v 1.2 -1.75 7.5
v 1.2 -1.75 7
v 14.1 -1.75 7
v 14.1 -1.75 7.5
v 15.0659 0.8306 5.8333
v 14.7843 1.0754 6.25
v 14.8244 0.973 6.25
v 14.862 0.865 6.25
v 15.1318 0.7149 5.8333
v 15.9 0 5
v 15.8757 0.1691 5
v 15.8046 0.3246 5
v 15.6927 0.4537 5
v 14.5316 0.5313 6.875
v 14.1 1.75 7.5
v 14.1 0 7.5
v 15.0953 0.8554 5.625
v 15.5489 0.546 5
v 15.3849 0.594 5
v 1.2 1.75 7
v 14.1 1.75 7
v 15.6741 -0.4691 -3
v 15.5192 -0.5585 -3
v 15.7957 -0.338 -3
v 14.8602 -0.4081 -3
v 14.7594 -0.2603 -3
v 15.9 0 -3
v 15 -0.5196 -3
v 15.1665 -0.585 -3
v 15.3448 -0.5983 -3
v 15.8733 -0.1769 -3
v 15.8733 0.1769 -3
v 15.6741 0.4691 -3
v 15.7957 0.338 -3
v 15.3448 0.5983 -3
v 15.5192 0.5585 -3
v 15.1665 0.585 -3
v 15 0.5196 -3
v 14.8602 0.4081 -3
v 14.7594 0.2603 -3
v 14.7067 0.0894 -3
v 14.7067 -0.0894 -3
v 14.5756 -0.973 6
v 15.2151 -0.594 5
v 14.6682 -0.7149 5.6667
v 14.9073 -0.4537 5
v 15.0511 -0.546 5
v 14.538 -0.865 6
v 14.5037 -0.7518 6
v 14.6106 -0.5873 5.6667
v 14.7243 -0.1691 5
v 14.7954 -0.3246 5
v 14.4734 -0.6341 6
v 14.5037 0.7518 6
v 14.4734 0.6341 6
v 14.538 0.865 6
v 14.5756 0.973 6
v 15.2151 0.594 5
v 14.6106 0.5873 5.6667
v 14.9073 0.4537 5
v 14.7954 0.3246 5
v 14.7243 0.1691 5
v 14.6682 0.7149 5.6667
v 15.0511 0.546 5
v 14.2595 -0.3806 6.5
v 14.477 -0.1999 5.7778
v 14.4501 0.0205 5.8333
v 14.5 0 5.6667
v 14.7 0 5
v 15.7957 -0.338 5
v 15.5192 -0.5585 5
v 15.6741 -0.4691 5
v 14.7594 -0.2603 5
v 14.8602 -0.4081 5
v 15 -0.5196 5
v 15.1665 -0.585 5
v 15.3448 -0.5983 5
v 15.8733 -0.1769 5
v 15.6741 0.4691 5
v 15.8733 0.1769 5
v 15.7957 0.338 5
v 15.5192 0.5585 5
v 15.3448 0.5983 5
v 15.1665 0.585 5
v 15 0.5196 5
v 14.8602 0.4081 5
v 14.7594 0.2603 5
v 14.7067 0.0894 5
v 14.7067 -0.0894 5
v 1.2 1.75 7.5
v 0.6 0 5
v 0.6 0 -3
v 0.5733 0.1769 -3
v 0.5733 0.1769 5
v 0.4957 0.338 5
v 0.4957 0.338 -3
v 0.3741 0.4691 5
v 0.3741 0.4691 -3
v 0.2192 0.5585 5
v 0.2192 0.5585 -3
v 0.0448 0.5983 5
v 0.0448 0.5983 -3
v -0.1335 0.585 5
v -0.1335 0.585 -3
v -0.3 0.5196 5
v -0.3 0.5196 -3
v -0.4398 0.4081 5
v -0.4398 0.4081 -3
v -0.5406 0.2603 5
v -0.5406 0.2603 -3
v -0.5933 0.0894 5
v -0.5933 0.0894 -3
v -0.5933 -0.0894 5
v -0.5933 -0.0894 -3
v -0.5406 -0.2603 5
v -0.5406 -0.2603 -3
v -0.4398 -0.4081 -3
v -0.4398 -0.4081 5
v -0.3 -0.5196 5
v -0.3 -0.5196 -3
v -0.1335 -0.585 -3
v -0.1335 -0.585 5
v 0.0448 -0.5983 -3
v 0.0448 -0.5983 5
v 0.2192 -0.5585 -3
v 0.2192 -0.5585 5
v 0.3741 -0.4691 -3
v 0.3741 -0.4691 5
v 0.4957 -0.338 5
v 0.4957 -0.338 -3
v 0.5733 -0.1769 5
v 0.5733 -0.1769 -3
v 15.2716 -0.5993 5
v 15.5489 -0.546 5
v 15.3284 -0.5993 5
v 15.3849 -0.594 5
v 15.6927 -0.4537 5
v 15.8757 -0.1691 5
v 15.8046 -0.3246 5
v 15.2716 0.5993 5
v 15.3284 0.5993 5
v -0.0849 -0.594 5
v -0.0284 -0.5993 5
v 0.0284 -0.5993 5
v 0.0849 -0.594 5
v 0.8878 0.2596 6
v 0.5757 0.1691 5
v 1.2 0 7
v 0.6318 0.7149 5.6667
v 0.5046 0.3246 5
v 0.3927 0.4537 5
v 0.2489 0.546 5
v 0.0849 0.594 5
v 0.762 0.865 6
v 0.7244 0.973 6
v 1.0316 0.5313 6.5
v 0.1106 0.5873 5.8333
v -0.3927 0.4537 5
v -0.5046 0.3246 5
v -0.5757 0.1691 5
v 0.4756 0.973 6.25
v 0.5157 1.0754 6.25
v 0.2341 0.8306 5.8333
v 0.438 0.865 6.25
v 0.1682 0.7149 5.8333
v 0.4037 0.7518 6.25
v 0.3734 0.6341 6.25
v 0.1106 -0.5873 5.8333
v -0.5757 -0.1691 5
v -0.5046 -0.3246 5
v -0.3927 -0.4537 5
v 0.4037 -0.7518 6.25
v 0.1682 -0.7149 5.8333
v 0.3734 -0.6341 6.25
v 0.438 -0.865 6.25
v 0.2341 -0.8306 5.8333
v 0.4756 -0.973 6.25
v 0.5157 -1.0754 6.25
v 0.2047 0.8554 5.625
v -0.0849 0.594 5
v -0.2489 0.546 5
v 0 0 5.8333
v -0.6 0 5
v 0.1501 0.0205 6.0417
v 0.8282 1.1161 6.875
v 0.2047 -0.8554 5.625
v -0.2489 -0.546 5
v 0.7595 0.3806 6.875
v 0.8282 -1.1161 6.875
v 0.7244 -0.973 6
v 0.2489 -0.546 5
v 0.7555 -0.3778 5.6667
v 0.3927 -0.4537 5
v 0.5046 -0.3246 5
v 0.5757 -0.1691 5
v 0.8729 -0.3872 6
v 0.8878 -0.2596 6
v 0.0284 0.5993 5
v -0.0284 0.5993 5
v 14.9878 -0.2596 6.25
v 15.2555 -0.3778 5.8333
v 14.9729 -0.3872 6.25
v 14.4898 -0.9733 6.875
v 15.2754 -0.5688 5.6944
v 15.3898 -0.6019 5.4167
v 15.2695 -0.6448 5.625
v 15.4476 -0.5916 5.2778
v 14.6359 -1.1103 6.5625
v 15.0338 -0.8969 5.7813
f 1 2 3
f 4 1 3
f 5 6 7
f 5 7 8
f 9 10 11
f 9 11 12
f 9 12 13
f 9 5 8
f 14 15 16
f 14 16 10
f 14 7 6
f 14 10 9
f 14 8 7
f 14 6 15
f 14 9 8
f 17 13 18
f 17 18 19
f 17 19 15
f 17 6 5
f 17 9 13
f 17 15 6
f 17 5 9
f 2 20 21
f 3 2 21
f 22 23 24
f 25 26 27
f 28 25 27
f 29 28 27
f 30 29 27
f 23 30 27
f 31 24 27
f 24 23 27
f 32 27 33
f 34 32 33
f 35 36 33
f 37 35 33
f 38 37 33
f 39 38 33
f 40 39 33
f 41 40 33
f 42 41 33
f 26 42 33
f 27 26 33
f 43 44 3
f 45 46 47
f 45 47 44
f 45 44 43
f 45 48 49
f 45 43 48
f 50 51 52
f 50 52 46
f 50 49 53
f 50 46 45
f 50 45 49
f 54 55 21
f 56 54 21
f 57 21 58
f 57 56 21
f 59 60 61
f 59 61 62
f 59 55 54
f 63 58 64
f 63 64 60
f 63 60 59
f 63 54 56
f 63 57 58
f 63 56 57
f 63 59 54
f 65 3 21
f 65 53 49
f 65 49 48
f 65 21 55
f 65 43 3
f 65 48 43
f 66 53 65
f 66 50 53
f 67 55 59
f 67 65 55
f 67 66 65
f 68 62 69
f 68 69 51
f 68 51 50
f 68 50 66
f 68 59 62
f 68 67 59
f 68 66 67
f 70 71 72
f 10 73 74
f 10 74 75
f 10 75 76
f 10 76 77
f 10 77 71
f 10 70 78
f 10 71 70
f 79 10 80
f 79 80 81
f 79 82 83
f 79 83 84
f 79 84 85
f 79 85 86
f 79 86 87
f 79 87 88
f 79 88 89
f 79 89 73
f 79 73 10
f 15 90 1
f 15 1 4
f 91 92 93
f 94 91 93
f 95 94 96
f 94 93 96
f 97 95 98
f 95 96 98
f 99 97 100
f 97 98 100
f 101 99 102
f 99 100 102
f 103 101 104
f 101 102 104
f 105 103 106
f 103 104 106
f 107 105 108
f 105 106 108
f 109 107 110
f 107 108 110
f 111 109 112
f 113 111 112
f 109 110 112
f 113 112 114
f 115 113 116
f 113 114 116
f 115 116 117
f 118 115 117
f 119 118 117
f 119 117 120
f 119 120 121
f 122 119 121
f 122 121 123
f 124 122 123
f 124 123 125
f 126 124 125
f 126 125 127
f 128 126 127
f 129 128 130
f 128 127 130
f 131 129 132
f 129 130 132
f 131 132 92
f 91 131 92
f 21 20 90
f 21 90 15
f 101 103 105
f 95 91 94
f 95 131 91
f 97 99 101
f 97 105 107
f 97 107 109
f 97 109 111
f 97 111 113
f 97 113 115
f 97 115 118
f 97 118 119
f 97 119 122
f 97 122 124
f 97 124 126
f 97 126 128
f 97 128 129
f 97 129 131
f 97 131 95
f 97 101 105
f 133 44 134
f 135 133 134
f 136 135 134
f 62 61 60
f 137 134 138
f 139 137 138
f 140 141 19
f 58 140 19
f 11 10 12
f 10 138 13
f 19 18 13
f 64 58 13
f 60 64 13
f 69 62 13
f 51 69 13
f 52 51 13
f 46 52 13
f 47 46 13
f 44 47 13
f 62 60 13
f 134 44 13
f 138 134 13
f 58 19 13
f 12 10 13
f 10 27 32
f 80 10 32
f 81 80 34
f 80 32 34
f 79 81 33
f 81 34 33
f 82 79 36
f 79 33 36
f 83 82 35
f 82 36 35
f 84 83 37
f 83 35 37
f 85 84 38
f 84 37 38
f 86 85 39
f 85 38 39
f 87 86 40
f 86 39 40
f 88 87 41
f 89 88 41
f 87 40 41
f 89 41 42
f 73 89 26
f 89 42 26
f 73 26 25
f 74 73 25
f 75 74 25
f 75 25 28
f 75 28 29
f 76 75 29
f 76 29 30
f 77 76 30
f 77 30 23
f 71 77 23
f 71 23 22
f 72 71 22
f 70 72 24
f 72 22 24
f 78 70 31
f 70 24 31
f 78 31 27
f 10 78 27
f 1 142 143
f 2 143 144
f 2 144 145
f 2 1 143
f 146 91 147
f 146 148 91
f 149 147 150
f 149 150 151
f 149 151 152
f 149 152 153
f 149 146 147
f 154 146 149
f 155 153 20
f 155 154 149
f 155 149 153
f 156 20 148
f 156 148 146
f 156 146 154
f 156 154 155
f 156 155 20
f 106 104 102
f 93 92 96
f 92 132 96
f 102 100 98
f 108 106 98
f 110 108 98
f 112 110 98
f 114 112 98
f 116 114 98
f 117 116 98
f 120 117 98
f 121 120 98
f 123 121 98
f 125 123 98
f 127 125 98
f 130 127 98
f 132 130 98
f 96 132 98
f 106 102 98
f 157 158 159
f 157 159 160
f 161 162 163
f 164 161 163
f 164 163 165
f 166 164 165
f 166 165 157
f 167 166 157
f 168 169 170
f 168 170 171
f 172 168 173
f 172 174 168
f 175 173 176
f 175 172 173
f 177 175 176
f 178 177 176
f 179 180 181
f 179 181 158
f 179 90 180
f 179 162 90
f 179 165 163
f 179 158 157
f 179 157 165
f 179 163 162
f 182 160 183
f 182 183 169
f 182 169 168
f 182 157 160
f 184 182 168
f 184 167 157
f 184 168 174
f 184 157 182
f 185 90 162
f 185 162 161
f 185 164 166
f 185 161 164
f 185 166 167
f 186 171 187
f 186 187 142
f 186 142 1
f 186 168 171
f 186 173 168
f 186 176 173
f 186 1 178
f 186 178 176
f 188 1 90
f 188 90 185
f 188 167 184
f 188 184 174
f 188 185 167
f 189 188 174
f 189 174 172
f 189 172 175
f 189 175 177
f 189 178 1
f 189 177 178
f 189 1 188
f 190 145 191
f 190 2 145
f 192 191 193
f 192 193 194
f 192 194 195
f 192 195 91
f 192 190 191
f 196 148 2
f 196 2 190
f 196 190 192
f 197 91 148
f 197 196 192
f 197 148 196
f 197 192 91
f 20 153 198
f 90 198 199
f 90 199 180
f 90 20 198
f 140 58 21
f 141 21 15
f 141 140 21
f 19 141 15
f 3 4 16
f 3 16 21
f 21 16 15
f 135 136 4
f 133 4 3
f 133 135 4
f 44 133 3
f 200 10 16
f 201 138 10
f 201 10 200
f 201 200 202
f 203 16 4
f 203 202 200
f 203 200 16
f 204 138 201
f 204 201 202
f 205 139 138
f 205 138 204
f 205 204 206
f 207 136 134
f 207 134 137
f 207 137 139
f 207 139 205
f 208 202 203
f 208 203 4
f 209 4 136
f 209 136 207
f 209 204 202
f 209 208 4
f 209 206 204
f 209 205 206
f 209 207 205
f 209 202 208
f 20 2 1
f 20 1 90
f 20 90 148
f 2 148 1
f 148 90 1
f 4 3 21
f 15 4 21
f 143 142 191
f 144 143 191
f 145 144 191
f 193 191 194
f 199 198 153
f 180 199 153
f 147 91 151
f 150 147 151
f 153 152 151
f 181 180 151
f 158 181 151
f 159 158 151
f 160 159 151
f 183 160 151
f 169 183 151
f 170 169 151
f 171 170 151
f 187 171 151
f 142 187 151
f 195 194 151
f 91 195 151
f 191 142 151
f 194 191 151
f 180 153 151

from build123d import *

# Parameters (mm, degrees)
SKETCH_R     = 0.6
PAD_DEPTH    = 8
SKETCH001_W  = 12.9
SKETCH001_H  = 3.5
PAD001_DEPTH = 0.5
SKETCH002_W  = 3.5
SKETCH002_H  = 0.5
SKETCH003_R  = 0.6
SKETCH004_R  = 0.6
SKETCH005_W  = 3.5
SKETCH005_H  = 0.5


with BuildPart() as pad:
    # Sketch → Pad (new body)
    with BuildSketch(Plane.XY.offset(-3)):
        Circle(SKETCH_R)
        with Locations((15.3, 0)):
            Circle(SKETCH_R)
    extrude(amount=PAD_DEPTH)


with BuildPart() as pad001:
    # Sketch001 → Pad001 (new body)
    with BuildSketch(Plane.XY.offset(7)):
        with Locations((7.65, 0)):
            Rectangle(SKETCH001_W, SKETCH001_H)
    extrude(amount=PAD001_DEPTH)


with BuildPart() as loft_body:
    # Sketch002 → Loft section 0
    with BuildSketch(Plane(origin=(14.1, 0, 7), x_dir=(0, 1, 0), z_dir=(1, 0, 0))):
        with Locations((0, 0.25)):
            Rectangle(SKETCH002_W, SKETCH002_H)
    # Sketch003 → Loft section 1
    with BuildSketch(Plane.XY.offset(5)):
        with Locations((15.3, 0)):
            Circle(SKETCH003_R)
    loft()


with BuildPart() as loft001:
    # Sketch004 → Loft001 section 0
    with BuildSketch(Plane.XY.offset(5)):
        Circle(SKETCH004_R)
    # Sketch005 → Loft001 section 1
    with BuildSketch(Plane(origin=(1.2, 0, 7), x_dir=(0, -1, 0), z_dir=(-1, 0, 0))):
        with Locations((0, 0.25)):
            Rectangle(SKETCH005_W, SKETCH005_H)
    loft()


solid = Compound([pad.part, pad001.part, loft_body.part, loft001.part])
